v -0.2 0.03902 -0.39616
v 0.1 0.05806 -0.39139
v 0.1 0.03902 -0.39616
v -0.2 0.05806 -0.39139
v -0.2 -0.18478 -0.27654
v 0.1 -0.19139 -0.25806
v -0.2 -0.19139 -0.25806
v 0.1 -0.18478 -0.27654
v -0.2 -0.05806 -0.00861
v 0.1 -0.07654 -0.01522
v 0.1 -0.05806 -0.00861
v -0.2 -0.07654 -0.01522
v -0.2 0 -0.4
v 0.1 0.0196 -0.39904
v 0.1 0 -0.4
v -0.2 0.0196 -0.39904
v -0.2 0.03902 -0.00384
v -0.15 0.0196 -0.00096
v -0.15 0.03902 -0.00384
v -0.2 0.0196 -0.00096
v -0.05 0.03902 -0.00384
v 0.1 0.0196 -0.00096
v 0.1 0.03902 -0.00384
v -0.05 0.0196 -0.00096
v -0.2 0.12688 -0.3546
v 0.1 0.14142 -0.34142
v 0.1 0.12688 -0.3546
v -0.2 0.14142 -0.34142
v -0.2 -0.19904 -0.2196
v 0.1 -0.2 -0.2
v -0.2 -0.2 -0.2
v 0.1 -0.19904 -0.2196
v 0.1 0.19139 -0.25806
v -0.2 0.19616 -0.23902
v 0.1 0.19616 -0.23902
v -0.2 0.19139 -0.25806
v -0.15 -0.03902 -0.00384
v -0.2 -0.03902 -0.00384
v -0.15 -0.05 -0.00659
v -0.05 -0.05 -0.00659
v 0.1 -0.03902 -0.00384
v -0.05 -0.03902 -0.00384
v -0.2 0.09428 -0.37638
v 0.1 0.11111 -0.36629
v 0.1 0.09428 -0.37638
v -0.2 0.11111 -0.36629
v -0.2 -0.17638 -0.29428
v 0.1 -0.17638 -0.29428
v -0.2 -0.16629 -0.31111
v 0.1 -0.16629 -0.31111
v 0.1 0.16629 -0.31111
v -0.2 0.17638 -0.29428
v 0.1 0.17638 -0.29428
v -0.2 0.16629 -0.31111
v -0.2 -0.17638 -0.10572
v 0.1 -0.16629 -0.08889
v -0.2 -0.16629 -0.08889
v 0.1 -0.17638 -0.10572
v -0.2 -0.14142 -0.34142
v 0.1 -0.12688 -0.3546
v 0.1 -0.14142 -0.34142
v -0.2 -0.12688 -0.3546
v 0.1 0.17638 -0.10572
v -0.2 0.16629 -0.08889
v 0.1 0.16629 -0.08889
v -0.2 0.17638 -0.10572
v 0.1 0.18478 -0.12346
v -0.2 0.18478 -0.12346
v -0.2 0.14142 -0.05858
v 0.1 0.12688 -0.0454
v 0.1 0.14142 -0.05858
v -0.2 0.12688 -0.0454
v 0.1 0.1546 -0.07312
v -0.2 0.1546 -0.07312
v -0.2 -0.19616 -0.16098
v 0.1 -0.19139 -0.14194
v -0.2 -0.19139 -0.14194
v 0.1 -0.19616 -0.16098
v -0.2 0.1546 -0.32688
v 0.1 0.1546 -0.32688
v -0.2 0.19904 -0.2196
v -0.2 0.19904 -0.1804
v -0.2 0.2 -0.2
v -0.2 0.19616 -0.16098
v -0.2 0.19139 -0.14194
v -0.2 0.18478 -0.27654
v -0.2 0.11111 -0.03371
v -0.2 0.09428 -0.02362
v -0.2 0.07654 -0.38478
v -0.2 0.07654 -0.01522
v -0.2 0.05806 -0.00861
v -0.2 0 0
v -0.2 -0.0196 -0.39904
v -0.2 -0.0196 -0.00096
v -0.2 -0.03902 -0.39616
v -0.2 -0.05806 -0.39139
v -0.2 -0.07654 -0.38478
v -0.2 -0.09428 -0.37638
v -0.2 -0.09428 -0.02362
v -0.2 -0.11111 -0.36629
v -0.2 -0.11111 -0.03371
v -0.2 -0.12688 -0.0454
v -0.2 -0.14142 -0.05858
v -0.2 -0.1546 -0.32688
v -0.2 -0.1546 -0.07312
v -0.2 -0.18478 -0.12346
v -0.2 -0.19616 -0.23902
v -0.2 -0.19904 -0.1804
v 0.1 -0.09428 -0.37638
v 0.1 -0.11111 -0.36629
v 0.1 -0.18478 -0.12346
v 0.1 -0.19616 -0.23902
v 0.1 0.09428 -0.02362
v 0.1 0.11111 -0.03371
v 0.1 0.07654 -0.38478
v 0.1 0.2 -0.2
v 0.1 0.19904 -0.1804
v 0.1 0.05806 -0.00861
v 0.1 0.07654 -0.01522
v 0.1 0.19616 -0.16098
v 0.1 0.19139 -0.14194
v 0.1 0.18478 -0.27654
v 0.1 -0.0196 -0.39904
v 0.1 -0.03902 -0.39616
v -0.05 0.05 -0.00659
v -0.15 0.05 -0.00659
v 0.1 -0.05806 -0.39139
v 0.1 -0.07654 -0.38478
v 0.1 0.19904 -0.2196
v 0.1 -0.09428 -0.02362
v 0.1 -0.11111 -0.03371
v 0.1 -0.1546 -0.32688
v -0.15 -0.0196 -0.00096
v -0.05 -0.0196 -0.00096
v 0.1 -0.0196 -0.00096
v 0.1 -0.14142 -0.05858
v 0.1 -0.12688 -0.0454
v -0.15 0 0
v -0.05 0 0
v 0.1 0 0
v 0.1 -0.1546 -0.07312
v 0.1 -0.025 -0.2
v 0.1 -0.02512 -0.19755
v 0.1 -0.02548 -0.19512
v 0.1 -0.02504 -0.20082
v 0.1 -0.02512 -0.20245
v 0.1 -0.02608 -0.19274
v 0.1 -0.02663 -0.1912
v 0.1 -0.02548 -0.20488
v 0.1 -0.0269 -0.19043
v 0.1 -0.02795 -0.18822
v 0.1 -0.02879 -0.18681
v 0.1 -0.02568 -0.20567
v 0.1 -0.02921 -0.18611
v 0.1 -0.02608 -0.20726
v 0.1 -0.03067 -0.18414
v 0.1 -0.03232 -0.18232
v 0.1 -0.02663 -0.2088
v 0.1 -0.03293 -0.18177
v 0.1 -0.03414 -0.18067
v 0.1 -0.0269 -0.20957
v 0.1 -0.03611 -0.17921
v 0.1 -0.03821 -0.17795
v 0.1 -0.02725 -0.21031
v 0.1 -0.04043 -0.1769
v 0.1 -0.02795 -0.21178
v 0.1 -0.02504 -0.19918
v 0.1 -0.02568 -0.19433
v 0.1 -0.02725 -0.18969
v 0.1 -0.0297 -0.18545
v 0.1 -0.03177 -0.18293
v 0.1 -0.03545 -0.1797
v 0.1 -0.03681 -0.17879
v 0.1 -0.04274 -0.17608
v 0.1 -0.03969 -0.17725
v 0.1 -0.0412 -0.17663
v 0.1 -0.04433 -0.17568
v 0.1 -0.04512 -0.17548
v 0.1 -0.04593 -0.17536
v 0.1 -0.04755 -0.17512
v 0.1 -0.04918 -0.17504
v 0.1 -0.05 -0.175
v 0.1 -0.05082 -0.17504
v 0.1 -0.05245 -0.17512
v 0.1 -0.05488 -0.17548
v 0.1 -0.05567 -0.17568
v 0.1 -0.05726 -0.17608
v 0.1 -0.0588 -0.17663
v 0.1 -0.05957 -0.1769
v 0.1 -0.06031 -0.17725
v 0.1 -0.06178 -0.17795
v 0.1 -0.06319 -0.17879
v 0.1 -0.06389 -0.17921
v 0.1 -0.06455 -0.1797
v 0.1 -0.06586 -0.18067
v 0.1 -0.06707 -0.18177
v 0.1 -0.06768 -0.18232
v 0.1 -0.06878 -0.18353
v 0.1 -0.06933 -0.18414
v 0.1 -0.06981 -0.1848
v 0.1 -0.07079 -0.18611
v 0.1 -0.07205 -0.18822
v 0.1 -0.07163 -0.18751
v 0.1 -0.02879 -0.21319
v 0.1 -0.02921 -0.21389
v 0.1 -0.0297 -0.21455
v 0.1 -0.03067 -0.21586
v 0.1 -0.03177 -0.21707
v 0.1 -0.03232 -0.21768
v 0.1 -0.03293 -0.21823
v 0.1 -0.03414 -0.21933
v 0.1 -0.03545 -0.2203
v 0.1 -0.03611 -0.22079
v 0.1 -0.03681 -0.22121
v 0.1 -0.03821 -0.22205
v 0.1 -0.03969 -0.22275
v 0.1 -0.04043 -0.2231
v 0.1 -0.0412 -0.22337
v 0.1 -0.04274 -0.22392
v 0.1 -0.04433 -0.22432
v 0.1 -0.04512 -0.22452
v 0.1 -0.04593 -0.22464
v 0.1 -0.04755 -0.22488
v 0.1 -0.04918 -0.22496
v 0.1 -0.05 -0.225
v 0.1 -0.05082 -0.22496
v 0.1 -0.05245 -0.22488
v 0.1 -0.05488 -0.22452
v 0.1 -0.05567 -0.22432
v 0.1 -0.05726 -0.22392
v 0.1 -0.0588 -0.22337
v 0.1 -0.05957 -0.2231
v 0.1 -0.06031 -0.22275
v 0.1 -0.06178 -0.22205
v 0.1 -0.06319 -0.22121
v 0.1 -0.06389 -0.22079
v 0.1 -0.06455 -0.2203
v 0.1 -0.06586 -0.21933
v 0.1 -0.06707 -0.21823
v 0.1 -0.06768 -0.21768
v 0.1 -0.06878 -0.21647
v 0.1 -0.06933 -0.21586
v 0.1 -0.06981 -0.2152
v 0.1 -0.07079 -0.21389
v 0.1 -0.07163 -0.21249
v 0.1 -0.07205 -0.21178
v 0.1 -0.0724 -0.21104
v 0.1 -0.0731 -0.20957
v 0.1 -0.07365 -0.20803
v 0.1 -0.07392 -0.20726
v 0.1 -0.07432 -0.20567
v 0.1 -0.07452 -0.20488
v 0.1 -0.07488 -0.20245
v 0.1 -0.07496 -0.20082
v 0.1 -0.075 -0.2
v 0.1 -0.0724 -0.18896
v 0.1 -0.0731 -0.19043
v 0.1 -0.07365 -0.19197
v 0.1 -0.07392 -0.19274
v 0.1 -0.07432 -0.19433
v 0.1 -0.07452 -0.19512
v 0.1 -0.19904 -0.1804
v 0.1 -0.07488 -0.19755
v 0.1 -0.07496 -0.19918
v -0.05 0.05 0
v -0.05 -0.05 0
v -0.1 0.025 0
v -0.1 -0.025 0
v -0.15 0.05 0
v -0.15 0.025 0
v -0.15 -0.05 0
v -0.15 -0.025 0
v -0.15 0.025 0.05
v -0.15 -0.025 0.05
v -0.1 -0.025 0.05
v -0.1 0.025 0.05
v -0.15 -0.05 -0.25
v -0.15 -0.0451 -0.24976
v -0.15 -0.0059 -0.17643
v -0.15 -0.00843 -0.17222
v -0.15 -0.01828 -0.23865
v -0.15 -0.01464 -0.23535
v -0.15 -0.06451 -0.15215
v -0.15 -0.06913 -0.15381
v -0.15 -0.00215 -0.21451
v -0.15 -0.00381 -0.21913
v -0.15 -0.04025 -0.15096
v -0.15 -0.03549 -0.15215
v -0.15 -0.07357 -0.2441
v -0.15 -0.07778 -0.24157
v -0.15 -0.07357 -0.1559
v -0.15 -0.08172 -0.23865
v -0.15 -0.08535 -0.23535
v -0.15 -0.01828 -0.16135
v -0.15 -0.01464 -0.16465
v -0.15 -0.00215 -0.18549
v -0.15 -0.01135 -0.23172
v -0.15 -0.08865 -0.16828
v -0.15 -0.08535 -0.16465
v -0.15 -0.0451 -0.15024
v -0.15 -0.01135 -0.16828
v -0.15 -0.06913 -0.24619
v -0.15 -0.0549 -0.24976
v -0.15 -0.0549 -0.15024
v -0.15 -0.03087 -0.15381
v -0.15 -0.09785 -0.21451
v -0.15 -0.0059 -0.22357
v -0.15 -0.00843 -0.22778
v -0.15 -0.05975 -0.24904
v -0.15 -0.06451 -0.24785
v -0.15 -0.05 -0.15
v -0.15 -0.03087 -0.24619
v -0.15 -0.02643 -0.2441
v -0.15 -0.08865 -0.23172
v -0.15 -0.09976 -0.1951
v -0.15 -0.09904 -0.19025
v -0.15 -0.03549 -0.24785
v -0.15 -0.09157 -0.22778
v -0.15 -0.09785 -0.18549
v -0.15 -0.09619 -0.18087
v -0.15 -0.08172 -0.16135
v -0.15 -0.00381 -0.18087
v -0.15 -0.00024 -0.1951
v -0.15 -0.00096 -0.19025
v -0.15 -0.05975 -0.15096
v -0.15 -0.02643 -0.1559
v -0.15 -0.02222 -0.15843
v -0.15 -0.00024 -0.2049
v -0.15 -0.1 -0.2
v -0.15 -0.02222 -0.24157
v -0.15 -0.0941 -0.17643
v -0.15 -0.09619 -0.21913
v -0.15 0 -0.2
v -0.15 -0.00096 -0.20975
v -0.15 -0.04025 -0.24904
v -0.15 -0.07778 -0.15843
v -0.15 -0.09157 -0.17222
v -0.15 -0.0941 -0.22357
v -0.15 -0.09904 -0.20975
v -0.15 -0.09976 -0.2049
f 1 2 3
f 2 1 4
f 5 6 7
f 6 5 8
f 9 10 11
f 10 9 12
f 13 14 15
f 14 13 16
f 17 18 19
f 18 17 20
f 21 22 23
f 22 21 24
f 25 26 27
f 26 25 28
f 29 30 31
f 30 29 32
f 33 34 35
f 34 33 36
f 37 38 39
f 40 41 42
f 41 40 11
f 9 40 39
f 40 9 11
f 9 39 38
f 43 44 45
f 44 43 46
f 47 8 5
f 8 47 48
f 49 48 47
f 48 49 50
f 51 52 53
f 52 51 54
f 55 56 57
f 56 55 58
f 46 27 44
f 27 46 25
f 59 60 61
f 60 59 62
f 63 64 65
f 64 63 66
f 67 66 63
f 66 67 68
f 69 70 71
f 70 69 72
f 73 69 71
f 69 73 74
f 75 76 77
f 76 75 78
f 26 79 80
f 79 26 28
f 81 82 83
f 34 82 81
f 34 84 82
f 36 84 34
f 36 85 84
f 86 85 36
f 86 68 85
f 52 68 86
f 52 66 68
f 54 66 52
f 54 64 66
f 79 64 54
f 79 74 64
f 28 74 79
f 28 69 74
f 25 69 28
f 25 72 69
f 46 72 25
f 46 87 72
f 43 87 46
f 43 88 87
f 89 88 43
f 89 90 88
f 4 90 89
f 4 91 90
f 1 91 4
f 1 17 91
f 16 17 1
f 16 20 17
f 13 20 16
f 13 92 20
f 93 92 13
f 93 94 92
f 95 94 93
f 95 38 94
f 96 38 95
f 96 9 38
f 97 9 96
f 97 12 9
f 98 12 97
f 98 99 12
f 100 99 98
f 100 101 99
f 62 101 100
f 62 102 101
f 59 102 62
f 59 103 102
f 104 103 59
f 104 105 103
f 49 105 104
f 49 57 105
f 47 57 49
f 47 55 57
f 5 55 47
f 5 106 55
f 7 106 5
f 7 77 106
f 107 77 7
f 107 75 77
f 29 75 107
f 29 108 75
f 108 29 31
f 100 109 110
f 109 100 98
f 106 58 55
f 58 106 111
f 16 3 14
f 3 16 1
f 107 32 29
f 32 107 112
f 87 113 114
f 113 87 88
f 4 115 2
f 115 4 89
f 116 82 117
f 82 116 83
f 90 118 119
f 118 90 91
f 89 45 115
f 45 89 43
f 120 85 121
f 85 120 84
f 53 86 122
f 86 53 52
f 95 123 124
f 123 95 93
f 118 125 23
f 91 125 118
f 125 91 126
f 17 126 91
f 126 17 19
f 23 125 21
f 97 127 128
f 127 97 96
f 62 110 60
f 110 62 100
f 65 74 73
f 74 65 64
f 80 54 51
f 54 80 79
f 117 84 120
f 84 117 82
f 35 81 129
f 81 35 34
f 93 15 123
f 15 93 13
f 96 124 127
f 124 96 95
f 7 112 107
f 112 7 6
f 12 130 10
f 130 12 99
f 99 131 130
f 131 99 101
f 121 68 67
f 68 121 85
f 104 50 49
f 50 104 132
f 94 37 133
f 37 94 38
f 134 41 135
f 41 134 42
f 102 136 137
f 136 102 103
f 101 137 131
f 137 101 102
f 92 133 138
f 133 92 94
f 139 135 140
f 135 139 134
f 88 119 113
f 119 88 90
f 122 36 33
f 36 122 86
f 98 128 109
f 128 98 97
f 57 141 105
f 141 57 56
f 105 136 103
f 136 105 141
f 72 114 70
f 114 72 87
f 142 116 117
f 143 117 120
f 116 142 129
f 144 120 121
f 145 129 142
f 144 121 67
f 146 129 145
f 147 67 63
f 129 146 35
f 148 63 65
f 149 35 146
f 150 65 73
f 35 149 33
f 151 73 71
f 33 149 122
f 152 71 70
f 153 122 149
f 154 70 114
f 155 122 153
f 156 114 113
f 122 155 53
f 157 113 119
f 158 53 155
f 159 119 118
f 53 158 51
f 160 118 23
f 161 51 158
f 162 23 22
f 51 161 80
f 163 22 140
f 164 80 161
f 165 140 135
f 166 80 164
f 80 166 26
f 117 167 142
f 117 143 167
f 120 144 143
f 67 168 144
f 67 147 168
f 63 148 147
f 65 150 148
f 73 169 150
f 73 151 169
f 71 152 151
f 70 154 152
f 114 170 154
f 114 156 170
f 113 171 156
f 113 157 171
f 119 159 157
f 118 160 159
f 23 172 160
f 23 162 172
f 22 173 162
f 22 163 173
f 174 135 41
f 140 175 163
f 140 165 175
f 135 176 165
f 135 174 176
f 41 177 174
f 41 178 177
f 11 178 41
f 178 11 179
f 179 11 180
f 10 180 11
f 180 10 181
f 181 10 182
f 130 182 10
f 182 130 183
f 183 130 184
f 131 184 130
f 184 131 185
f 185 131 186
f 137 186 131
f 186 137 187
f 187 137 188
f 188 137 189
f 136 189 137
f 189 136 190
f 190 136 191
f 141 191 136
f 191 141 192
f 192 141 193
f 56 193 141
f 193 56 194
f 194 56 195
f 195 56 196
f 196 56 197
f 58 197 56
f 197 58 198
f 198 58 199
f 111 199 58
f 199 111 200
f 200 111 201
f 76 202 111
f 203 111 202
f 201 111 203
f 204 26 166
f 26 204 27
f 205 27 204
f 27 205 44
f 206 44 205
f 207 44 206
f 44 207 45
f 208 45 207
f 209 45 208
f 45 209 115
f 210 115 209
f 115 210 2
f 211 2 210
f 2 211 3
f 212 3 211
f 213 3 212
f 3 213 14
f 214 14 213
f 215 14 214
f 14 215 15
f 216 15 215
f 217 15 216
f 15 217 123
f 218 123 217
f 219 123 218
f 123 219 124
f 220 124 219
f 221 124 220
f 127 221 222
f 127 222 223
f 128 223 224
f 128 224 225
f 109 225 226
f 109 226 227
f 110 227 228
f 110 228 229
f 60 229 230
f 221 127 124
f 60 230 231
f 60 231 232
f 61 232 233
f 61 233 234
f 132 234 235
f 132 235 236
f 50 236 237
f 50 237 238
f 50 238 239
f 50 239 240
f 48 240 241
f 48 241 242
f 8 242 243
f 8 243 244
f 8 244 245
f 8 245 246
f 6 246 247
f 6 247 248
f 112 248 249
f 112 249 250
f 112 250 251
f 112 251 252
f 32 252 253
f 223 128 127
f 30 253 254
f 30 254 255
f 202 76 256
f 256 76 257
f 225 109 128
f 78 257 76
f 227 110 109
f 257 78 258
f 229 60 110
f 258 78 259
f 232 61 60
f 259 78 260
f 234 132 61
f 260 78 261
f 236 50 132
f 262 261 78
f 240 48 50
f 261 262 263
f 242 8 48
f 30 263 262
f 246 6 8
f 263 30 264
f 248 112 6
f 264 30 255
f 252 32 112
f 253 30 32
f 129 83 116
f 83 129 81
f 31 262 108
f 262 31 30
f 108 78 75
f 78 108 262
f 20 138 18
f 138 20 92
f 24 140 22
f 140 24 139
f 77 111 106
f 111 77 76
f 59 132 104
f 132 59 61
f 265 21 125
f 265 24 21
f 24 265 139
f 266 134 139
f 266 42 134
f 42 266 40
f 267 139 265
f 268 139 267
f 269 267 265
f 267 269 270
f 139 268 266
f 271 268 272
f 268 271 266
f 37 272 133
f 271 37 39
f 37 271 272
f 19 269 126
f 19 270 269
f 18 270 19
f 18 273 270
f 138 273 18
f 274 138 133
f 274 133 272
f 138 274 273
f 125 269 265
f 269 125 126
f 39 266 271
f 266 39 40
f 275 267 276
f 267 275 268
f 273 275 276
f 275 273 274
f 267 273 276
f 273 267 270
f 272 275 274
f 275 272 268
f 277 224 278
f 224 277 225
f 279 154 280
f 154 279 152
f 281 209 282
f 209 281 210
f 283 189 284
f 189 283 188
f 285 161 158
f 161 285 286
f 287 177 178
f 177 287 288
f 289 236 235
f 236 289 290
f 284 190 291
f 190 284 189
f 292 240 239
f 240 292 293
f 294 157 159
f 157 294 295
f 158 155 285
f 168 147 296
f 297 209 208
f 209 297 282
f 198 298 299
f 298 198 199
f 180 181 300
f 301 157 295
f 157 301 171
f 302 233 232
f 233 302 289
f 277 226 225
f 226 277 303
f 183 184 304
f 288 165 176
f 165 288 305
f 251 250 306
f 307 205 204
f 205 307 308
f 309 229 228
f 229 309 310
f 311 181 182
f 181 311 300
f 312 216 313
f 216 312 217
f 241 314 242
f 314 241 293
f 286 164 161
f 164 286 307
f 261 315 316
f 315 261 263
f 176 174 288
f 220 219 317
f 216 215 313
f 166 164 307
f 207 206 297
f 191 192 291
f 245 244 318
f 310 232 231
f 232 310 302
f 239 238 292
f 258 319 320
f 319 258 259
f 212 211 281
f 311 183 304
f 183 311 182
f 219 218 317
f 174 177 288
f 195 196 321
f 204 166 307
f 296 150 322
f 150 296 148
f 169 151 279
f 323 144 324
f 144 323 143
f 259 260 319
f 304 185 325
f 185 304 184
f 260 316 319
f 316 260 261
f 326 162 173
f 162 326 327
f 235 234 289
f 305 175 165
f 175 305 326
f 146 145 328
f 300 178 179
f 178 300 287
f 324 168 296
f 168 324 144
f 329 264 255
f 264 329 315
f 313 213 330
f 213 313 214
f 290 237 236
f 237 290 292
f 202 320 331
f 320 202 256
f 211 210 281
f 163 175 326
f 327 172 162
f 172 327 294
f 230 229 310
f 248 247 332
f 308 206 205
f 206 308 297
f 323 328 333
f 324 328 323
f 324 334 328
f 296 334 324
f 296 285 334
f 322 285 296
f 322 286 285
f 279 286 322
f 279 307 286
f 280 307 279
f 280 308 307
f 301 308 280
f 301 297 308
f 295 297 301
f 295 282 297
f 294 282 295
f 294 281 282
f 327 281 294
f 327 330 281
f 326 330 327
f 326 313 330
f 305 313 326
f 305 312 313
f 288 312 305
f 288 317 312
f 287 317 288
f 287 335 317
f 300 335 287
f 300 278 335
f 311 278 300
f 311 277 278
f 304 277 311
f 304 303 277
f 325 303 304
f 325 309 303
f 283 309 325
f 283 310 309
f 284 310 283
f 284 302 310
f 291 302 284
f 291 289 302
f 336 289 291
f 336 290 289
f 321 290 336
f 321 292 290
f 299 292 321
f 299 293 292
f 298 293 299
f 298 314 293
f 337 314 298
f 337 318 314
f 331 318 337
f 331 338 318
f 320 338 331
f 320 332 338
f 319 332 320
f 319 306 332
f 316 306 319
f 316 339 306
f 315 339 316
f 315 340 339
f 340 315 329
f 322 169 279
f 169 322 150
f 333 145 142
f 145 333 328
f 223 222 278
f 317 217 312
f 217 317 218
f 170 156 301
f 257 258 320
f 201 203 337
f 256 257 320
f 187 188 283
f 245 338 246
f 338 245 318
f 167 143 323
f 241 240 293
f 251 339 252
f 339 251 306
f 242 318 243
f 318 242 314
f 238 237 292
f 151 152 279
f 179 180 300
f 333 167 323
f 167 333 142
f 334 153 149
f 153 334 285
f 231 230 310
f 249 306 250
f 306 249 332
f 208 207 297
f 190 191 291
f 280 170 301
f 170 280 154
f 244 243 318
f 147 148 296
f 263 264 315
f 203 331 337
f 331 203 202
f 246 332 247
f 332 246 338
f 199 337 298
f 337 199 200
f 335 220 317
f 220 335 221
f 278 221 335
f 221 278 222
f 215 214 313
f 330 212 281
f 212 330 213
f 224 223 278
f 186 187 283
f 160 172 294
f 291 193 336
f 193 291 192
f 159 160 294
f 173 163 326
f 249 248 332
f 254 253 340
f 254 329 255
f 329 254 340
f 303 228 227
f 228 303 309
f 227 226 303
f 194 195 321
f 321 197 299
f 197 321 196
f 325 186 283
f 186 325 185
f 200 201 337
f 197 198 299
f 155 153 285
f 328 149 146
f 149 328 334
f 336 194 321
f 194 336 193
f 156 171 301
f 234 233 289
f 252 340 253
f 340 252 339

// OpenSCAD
module arc_bracket() {
    difference() {
        union() {
            // Outer arc
            rotate([0, 90, 0])
            translate([0, 0, -0.2])
            cylinder(r=0.2, h=0.3, $fn=64);

            // Inner arc
            rotate([0, 90, 0])
            translate([0, 0, -0.2])
            cylinder(r=0.15, h=0.3, $fn=64);

            // End block with tab
            translate([-0.15, -0.05, 0.1])
            cube([0.1, 0.1, 0.1]);

            // Protruding tab
            translate([-0.15, -0.025, 0.2])
            cube([0.05, 0.05, 0.05]);
        }

        // Tapered slot
        translate([-0.15, -0.05, 0])
        rotate([0, 90, 0])
        cylinder(r1=0.05, r2=0.02, h=0.3, $fn=64);
    }
}

translate([0, 0, -0.2])
arc_bracket();
